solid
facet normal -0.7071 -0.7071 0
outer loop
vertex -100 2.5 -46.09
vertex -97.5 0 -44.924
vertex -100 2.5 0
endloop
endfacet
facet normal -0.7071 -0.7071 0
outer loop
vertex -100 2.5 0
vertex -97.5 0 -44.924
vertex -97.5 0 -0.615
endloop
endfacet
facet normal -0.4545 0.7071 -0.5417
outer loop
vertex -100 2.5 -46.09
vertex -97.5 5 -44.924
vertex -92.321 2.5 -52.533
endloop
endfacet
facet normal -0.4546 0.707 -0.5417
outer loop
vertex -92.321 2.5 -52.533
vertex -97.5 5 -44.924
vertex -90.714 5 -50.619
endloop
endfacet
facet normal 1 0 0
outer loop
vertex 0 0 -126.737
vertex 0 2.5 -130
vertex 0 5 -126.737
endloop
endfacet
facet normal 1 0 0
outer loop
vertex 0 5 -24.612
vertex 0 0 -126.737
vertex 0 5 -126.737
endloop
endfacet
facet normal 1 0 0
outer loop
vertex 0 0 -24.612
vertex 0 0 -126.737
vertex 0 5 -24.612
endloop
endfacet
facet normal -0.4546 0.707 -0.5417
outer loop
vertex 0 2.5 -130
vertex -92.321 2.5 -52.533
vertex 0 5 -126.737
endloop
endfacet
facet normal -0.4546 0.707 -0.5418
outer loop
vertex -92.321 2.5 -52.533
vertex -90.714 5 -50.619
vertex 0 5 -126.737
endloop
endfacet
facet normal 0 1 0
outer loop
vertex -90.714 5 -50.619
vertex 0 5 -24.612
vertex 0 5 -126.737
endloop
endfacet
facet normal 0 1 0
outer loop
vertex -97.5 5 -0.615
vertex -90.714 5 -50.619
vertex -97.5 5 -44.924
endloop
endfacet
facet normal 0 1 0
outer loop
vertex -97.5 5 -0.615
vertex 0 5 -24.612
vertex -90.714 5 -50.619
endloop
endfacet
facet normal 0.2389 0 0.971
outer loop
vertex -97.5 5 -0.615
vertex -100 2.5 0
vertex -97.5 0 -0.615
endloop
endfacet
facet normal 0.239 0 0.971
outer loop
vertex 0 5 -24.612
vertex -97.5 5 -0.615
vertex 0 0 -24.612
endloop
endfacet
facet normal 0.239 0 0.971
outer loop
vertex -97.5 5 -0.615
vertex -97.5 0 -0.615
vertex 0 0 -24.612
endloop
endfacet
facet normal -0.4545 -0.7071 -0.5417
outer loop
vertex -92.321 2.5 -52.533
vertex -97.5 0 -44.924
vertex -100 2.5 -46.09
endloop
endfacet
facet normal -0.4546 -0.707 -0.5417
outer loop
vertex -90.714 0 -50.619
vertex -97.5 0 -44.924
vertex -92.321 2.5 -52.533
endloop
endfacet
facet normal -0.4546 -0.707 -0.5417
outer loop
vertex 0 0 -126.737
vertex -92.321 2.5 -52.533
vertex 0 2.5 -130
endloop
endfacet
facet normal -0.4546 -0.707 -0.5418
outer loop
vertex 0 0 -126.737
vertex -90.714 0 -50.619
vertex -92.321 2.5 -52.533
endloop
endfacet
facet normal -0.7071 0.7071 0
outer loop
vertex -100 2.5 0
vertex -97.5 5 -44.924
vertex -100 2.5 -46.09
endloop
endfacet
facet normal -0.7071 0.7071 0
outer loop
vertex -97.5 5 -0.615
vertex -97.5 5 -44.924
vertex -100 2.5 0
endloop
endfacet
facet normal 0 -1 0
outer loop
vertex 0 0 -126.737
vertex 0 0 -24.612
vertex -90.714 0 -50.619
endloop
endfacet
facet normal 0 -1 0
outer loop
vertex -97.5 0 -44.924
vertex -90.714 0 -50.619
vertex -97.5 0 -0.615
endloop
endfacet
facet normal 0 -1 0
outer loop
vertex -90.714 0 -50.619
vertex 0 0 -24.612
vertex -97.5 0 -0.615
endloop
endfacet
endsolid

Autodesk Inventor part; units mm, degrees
ref_plane "YZ Plane" through (0, 0, 0) normal (1, 0, 0) x (0, 1, 0)
ref_plane "XZ Plane" through (0, 0, 0) normal (0, 1, 0) x (-1, 0, 0)
ref_plane "XY Plane" through (0, 0, 0) normal (0, 0, 1) x (1, 0, 0)
sketch "스케치1" plane through (0, 0, 0) normal (0, 1, 0) x (-1, 0, 0)
  line L0 (0, 0) -> (100, 0)
  line L1 (100, 0) -> (100, -130)
  line L2 (100, -130) -> (0, -130)
  line L3 (0, -130) -> (0, 0)
  line L4 (0, -130) -> (92.3211, -52.5334)
  line L5 (0, -130) -> (120.5166, -130) construction
  line L6 (92.3211, -52.5334) -> (100, -46.09)
  line L7 (100, 0) -> (0, -24.6121)
  dimension "d0" = 100
  dimension "d1" = 130
  dimension "d2" = 40
extrude "돌출1" add sketch "스케치1" along normal blind 5 contours L1 L6 L4 L3 L7
chamfer "모따기1" distance 2.5 angle 45 4 edges at (-46.1605, 5, -91.2667) (-46.1605, 0, -91.2667) (-100, 5, -23.045) (-100, 0, -23.045)
properties part number "날개1"
